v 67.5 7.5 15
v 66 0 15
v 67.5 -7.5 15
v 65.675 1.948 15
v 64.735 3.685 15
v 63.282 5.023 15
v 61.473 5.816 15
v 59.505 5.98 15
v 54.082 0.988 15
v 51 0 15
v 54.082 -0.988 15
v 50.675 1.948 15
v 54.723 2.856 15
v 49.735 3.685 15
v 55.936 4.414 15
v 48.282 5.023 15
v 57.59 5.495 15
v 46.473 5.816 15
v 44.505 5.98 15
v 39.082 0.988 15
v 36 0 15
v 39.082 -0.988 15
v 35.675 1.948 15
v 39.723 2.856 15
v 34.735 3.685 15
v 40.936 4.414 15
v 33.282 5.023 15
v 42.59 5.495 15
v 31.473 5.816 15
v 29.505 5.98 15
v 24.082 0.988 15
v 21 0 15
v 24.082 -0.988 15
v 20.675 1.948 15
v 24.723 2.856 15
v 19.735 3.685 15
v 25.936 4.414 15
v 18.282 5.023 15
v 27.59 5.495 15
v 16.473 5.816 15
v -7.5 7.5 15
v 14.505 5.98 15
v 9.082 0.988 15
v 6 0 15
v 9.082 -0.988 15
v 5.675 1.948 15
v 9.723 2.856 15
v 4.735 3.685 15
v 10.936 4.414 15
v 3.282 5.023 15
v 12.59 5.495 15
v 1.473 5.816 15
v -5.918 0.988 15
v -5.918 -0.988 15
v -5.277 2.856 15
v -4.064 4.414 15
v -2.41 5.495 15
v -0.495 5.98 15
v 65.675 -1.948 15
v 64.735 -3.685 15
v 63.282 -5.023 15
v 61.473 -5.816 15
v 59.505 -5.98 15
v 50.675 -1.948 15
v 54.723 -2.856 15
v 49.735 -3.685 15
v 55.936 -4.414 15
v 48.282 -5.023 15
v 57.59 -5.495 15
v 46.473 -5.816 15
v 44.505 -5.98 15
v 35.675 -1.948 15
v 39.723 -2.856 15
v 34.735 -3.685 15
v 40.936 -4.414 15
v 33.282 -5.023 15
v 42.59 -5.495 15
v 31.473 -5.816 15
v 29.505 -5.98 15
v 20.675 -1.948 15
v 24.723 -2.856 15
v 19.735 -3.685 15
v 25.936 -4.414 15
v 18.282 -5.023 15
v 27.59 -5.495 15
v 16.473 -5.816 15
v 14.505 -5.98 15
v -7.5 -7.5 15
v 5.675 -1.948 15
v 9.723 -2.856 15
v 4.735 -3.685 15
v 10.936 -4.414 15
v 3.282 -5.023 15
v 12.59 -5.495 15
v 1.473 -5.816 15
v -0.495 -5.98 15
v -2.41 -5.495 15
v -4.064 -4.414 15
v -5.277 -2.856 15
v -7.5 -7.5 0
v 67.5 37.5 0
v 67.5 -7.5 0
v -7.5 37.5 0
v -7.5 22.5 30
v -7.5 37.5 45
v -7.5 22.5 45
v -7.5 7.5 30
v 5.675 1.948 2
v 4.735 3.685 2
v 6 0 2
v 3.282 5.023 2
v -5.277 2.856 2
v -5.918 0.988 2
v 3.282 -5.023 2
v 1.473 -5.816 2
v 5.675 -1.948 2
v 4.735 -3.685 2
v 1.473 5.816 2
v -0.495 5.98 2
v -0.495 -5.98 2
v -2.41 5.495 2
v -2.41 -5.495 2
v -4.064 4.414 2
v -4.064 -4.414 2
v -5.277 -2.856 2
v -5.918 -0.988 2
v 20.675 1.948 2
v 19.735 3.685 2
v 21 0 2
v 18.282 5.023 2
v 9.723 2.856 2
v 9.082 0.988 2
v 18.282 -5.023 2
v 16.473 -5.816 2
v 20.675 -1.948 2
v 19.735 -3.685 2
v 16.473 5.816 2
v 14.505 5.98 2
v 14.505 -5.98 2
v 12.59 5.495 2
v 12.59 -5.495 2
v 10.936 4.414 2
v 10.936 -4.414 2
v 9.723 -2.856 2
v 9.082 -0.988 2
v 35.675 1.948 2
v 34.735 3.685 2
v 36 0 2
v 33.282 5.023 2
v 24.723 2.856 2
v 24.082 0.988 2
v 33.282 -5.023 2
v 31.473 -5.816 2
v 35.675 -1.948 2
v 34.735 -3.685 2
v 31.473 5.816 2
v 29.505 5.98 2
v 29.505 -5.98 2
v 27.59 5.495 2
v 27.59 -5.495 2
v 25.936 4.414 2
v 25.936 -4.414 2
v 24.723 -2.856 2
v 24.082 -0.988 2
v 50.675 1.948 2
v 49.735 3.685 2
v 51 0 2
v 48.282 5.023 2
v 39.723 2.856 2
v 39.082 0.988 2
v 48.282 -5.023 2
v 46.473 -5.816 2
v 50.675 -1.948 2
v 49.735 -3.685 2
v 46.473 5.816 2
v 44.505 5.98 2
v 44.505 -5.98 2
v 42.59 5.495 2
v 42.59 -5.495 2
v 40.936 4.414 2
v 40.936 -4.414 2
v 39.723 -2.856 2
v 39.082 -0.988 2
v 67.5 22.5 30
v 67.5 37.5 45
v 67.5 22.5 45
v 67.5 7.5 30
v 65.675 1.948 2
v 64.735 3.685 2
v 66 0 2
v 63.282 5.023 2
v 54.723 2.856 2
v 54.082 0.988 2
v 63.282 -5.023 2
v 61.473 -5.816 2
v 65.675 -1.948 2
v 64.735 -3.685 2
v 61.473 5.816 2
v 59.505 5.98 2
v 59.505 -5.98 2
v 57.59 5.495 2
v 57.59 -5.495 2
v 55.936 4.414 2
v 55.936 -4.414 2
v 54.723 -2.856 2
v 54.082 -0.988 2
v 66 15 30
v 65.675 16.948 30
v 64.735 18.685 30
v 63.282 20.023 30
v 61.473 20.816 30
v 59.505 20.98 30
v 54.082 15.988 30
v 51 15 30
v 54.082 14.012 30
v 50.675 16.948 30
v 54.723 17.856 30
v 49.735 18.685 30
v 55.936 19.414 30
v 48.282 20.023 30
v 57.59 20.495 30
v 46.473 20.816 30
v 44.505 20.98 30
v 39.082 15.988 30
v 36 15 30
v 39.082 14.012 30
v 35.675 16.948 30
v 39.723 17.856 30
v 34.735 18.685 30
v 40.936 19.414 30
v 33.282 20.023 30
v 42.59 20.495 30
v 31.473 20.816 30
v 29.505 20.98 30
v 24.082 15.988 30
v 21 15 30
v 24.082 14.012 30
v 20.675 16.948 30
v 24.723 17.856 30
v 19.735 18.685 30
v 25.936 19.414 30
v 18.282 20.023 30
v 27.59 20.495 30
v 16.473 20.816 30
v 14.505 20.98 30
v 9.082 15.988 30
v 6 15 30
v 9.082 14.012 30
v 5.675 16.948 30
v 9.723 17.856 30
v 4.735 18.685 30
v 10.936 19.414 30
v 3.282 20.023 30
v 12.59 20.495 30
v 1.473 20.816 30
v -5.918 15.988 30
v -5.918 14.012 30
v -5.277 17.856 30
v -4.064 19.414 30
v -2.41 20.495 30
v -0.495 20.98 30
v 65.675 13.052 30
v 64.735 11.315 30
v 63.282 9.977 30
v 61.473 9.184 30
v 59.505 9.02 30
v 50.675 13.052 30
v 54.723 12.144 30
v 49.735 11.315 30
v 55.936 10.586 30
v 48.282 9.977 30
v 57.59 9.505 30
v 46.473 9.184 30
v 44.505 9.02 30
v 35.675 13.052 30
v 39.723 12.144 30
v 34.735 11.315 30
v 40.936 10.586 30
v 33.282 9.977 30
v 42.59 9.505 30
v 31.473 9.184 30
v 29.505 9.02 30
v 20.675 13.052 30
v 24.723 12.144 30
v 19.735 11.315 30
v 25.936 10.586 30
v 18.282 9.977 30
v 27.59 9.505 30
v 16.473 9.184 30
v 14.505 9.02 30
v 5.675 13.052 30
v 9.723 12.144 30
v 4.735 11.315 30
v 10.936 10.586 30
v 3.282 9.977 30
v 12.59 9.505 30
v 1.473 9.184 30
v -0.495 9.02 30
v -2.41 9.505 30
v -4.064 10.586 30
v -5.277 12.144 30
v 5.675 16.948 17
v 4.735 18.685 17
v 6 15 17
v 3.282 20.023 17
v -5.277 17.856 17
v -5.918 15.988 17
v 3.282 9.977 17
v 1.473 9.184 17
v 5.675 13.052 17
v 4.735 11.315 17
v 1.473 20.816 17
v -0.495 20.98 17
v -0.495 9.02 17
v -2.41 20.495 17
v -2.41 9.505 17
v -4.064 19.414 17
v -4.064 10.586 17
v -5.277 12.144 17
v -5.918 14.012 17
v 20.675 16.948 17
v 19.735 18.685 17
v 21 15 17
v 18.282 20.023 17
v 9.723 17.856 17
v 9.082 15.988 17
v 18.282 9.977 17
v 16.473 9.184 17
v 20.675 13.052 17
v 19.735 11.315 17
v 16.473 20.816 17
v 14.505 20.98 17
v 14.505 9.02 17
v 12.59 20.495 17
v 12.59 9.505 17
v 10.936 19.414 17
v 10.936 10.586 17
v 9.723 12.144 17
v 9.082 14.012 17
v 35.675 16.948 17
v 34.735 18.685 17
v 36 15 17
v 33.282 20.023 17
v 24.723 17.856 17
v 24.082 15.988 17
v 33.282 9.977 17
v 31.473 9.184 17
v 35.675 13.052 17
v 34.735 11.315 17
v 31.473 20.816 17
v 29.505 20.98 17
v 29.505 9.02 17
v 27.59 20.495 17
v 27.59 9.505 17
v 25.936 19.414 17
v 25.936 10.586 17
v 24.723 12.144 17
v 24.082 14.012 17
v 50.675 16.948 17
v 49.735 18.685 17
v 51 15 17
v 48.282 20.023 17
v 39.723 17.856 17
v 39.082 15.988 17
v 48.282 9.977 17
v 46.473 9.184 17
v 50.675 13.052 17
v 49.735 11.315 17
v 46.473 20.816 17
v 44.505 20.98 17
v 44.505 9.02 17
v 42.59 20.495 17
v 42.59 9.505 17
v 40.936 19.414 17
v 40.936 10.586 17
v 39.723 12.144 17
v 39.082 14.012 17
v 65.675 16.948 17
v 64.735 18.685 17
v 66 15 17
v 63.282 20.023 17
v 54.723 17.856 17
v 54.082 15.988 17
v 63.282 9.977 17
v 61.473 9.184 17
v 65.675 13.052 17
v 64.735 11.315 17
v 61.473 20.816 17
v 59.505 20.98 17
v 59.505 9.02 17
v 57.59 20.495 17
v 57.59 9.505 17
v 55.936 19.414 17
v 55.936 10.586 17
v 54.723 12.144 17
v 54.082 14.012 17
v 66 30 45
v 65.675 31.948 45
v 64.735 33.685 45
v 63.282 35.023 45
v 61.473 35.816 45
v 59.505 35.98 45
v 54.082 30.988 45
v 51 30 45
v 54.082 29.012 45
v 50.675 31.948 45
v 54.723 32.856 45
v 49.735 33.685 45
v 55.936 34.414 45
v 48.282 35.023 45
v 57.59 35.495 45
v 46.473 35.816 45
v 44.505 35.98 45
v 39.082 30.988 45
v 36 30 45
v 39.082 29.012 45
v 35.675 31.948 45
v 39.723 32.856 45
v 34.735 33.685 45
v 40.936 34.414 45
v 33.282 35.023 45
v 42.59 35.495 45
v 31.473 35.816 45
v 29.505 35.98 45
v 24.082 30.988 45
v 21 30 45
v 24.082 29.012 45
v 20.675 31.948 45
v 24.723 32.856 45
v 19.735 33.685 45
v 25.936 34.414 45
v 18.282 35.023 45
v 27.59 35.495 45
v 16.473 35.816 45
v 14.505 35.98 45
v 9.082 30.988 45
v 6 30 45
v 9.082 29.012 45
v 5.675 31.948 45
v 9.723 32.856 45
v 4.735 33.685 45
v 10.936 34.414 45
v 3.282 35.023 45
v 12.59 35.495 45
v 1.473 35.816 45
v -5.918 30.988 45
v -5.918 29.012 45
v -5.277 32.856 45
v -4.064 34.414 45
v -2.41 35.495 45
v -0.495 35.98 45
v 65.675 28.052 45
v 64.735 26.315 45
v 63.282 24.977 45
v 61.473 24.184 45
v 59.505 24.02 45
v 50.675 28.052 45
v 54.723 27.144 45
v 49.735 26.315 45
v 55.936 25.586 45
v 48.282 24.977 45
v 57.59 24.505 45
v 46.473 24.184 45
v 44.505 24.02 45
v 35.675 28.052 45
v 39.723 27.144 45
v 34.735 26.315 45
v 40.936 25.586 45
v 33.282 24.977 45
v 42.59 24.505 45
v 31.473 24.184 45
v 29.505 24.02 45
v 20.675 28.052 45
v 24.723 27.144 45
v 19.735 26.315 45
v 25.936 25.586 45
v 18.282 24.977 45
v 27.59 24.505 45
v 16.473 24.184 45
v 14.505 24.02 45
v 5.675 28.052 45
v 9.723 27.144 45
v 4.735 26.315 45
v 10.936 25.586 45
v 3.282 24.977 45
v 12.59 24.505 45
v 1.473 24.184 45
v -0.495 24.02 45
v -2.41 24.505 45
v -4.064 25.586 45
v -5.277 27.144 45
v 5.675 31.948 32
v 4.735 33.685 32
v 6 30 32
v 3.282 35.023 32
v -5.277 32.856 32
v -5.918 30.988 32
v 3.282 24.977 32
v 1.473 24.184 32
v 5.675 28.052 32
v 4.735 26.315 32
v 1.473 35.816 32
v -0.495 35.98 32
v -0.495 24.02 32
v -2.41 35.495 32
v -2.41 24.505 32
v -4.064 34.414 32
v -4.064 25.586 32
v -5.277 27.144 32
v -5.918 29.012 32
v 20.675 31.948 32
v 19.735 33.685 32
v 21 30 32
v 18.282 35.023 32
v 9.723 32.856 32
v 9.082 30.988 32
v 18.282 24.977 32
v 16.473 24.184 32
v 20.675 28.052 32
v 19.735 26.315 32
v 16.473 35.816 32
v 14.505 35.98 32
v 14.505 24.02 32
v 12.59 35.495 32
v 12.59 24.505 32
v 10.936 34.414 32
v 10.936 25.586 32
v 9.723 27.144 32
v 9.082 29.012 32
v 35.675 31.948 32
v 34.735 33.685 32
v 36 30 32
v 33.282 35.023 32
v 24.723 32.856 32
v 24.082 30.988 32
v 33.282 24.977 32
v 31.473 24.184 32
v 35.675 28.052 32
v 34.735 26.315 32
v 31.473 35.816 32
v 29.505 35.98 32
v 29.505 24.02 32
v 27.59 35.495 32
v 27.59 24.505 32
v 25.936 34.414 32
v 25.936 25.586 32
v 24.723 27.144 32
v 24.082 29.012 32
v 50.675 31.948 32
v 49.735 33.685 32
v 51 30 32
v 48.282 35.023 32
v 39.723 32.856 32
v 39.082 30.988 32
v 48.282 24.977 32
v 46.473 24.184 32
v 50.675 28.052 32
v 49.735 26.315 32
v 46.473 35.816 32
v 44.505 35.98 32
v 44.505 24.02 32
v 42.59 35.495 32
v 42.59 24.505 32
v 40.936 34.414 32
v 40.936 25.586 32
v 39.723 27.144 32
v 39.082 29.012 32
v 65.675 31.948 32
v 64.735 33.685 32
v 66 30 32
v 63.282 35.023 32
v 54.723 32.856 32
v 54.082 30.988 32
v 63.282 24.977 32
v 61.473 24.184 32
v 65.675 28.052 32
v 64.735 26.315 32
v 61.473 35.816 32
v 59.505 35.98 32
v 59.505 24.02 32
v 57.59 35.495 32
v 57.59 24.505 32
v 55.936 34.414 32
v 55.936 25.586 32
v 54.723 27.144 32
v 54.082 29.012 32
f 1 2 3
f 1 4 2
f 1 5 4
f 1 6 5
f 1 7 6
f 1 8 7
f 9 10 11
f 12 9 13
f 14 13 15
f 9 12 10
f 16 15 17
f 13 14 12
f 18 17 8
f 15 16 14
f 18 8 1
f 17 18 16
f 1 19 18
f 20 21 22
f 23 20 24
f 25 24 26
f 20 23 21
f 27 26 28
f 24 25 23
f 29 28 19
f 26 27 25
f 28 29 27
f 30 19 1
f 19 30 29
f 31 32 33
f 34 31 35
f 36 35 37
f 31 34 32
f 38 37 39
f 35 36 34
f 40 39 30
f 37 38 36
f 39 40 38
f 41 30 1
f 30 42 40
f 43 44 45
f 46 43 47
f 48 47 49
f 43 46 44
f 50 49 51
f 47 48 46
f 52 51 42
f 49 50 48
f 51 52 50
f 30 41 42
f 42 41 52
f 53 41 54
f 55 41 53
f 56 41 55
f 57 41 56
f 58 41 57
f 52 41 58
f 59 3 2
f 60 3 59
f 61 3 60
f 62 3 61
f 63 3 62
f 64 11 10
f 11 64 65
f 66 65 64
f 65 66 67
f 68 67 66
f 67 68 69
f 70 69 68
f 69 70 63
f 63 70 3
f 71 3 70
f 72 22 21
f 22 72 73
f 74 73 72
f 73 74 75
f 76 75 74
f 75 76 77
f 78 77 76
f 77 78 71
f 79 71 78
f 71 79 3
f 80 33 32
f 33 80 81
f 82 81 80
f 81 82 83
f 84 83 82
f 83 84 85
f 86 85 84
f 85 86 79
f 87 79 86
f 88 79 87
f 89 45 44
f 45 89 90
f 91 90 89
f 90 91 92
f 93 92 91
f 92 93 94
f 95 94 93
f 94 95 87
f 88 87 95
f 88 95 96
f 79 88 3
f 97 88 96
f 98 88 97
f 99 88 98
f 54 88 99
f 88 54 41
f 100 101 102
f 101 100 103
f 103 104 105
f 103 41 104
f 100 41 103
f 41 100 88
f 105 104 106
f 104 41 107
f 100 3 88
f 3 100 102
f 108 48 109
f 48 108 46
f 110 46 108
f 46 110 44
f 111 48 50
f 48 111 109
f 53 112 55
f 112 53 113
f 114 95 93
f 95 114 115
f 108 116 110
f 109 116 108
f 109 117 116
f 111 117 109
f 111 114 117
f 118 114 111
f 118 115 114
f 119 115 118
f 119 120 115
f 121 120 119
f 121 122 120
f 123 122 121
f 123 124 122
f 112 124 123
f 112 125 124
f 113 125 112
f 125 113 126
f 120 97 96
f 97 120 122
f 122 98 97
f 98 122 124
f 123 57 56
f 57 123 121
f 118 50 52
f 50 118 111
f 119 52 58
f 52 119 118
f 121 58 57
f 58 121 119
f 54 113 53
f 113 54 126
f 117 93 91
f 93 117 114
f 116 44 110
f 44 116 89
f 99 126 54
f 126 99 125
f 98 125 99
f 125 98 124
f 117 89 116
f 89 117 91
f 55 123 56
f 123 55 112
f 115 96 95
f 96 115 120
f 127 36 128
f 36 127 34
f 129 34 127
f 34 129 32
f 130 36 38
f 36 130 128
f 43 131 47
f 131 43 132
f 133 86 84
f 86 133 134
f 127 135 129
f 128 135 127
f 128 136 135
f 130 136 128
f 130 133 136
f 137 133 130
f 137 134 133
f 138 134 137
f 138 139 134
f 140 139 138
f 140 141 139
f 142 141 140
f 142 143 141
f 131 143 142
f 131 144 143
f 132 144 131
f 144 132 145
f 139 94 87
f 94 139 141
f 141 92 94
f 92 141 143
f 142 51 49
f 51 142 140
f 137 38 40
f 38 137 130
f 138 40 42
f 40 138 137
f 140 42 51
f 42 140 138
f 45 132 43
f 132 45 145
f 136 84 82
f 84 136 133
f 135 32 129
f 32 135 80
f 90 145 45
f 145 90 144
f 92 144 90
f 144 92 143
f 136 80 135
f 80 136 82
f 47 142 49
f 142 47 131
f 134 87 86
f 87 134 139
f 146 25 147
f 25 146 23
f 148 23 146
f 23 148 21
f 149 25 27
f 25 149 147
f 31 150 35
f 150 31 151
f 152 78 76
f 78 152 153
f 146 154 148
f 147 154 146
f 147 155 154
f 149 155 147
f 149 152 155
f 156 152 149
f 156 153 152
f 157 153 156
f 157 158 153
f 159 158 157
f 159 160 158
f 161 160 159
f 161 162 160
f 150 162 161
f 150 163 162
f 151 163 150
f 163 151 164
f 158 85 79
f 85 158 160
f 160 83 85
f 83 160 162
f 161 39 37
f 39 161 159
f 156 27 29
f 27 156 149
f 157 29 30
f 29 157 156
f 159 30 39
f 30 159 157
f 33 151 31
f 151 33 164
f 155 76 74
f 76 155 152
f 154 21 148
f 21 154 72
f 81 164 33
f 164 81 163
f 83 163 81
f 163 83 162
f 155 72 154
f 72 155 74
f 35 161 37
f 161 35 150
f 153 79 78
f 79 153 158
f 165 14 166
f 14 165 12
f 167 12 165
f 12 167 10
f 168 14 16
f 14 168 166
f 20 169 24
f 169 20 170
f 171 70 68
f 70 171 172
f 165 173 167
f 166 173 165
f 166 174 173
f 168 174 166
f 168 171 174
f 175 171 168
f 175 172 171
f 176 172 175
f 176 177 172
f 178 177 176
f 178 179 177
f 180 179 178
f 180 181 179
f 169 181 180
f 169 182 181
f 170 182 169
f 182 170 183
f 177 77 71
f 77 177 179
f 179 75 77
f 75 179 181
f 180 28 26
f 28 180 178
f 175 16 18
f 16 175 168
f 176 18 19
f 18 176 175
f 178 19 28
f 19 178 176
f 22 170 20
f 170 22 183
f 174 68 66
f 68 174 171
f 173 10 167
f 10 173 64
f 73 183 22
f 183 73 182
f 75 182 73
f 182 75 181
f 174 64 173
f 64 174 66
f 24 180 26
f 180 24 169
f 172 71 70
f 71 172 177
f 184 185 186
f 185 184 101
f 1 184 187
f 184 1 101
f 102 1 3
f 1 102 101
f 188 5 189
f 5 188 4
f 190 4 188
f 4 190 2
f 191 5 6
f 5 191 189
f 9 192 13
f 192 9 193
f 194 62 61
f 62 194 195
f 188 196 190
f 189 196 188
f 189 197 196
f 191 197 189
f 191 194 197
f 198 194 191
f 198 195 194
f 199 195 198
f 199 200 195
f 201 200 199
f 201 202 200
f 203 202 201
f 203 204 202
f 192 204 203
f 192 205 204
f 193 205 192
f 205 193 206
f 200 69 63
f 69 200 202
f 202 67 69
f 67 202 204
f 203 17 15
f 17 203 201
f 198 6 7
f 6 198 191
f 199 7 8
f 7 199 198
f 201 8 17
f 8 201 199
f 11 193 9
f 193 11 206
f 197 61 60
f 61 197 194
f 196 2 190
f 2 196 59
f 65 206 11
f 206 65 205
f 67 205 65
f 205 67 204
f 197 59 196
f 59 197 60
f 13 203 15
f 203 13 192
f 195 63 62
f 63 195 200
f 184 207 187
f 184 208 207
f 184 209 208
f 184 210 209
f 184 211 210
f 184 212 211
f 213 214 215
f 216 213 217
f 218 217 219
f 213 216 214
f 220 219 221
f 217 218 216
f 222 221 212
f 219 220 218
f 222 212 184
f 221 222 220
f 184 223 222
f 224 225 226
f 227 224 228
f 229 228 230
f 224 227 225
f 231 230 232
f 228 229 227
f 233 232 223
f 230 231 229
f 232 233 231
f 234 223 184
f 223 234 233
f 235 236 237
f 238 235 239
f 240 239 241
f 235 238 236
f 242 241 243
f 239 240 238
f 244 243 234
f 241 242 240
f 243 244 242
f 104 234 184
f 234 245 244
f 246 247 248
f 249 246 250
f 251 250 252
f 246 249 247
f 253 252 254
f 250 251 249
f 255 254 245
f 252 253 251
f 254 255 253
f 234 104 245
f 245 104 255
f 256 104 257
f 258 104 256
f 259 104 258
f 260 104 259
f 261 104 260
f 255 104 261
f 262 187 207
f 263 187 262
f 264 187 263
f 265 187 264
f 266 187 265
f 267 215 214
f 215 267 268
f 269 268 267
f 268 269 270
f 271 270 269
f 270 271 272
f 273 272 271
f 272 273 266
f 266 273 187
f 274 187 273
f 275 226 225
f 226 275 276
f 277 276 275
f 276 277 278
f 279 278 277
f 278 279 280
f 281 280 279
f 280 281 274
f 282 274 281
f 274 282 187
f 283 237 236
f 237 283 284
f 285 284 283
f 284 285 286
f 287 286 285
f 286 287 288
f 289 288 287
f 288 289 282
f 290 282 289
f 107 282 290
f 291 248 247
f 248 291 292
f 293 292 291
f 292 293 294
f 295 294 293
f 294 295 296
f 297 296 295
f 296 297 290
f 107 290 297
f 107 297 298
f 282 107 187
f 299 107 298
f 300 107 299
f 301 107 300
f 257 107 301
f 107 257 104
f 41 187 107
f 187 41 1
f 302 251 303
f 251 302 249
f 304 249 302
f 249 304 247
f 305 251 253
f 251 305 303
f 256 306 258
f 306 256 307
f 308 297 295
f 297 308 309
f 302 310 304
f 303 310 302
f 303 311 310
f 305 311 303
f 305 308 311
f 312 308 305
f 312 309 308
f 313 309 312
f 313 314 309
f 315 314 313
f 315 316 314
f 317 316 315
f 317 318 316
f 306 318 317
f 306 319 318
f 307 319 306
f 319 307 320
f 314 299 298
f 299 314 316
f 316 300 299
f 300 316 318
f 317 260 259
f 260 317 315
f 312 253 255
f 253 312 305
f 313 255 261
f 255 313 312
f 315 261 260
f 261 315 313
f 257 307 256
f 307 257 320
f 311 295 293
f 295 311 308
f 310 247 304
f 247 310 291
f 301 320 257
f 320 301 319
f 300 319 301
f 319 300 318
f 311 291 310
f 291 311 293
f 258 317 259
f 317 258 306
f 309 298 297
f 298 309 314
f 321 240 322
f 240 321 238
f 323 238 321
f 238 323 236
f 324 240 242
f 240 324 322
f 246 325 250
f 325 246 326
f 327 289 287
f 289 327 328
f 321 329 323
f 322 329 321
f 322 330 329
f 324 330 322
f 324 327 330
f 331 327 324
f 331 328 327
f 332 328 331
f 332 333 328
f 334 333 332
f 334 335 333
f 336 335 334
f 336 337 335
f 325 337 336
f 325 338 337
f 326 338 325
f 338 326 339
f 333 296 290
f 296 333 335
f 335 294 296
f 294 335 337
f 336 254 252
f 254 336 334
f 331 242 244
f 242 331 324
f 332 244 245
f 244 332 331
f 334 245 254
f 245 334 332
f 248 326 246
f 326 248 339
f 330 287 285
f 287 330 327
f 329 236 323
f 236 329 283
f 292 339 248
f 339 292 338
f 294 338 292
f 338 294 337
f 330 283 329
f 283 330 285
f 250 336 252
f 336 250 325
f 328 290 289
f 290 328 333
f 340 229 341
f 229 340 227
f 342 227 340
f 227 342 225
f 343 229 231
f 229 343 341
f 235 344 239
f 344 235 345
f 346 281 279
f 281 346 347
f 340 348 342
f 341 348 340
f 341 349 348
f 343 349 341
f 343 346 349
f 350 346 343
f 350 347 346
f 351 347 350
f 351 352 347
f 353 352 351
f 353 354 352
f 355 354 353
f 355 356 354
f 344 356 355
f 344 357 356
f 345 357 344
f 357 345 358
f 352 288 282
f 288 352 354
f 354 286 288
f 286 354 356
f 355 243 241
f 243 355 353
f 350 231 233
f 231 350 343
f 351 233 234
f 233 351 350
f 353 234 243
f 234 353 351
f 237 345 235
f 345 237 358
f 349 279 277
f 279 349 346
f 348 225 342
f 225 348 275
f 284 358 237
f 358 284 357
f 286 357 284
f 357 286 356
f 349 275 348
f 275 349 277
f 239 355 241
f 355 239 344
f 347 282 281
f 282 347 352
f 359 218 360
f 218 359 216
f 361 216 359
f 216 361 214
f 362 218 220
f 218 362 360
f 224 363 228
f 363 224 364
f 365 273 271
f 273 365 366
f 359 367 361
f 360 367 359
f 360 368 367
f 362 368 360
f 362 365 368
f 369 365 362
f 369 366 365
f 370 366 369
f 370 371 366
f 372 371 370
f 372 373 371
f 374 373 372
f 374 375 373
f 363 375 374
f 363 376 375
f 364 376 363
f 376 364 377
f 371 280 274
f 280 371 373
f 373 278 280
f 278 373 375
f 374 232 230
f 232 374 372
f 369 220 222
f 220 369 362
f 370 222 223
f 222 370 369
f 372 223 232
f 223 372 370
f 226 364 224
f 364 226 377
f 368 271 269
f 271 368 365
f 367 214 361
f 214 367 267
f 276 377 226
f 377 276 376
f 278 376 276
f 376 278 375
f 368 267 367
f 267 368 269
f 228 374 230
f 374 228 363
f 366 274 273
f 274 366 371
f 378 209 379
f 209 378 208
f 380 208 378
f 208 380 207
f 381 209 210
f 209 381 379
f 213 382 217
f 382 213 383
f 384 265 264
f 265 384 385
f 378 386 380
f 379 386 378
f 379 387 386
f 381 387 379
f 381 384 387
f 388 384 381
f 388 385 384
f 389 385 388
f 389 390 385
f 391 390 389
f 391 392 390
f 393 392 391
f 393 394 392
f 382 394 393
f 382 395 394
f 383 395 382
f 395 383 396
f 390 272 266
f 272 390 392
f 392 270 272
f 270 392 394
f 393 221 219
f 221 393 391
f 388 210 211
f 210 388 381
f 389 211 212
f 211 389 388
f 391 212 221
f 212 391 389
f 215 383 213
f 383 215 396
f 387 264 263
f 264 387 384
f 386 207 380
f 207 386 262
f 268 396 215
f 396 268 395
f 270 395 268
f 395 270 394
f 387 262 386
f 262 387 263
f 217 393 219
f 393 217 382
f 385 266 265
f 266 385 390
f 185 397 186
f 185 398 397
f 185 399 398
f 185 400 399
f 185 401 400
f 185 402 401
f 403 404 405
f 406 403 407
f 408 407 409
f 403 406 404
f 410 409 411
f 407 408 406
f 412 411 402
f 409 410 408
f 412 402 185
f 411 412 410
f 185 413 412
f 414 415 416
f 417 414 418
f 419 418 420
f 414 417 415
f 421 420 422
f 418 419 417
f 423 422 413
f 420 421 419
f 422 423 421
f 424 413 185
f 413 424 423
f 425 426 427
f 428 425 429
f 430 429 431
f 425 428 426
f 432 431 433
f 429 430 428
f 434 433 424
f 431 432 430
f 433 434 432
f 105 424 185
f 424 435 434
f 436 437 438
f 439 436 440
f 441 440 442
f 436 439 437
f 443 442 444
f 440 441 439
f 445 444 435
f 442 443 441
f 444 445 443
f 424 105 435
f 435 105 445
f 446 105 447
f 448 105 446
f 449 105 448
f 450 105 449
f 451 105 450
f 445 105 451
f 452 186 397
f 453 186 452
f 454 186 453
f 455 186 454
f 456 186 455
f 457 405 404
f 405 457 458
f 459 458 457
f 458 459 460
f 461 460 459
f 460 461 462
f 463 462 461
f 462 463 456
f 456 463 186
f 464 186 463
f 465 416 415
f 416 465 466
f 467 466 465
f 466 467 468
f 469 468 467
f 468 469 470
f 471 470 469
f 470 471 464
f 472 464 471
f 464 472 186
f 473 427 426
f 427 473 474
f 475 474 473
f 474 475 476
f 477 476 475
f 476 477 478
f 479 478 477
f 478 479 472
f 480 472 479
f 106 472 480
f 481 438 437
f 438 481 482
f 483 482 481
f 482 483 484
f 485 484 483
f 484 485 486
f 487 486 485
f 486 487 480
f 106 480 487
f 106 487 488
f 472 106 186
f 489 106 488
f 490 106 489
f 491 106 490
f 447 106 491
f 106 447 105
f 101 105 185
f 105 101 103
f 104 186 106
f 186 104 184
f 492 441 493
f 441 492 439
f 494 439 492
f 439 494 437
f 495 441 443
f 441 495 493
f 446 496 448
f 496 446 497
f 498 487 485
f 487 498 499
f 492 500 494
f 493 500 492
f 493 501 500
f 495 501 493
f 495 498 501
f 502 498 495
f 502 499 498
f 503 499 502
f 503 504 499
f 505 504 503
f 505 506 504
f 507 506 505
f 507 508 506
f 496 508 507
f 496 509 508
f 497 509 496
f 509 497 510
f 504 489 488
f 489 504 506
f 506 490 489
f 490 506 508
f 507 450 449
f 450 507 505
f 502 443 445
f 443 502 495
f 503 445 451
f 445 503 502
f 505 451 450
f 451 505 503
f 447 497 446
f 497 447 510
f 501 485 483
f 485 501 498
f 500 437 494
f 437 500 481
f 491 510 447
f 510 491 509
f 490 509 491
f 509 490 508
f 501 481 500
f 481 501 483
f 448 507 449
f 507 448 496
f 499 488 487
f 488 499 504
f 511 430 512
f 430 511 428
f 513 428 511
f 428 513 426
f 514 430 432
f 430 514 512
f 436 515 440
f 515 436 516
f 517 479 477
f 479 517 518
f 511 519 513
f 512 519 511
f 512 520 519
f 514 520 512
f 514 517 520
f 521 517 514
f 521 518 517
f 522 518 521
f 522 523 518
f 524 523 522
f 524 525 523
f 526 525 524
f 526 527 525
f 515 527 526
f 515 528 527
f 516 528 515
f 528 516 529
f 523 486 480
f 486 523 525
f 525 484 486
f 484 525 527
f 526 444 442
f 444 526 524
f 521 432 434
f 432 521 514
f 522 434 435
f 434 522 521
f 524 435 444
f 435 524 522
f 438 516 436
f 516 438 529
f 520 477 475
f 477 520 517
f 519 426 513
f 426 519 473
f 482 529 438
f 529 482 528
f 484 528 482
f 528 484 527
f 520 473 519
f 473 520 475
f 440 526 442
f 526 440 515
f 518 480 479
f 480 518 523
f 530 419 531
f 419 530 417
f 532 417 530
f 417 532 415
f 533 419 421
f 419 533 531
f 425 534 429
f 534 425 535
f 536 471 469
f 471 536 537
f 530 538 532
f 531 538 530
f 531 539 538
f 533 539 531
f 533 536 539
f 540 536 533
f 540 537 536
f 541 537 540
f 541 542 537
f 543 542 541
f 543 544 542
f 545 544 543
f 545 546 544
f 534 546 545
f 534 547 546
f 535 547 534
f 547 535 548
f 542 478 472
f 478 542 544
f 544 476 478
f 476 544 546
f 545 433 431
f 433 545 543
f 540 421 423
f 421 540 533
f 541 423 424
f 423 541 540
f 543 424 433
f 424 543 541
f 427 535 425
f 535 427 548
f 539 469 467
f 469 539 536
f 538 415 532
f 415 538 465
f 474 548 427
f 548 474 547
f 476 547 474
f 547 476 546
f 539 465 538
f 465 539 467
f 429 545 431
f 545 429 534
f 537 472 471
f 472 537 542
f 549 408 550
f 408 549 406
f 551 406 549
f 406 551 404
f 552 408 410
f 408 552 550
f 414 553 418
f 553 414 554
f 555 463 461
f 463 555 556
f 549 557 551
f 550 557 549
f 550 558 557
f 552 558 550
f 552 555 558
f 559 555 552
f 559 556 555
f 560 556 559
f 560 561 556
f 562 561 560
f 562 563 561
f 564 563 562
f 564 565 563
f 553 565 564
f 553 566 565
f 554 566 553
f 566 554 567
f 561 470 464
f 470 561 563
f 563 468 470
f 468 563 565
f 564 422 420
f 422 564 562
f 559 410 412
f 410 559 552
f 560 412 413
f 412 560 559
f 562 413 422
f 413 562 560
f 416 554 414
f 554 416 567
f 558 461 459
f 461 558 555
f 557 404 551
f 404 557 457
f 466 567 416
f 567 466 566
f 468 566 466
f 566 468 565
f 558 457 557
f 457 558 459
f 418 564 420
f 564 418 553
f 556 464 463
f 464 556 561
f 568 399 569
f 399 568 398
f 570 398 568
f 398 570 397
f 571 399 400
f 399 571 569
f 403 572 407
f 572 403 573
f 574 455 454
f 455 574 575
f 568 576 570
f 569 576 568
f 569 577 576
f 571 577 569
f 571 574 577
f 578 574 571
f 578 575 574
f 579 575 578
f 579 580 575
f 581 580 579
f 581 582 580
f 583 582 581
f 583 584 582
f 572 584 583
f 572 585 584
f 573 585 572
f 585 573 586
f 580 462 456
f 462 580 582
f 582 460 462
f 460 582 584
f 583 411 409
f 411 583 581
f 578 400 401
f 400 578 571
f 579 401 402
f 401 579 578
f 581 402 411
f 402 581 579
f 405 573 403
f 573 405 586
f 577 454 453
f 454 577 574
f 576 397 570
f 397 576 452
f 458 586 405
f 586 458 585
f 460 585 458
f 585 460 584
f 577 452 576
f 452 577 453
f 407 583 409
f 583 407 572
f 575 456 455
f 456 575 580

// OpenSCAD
CUBE_EDGE = 15;
CUBES_PER_ROW = 5;
HOLE_RADIUS = 6;
HOLE_DEPTH_OFFSET = 2;
STEPS = 3;

module HoledCube() {
  difference() {
    translate([0,0, CUBE_EDGE/2])
      cube([CUBE_EDGE, CUBE_EDGE, CUBE_EDGE], center = true);
    
    translate([0, 0, HOLE_DEPTH_OFFSET]) 
      cylinder(CUBE_EDGE*2, HOLE_RADIUS, HOLE_RADIUS);
    
  }
}

module single_row() {
  for(i=[0: CUBES_PER_ROW-1])
    translate([i*CUBE_EDGE,0,0])
      HoledCube();
}

// all holed cubes
for(step=[0: STEPS-1])
  translate([0,step*CUBE_EDGE,step*CUBE_EDGE])
    single_row();

// stairs
translate([-CUBE_EDGE/2, CUBE_EDGE/2, 0])
  cube([CUBE_EDGE * CUBES_PER_ROW, CUBE_EDGE , CUBE_EDGE]);

translate([-CUBE_EDGE/2, 1.5*CUBE_EDGE, 0])
  cube([CUBE_EDGE * CUBES_PER_ROW, CUBE_EDGE , 2*CUBE_EDGE]);
